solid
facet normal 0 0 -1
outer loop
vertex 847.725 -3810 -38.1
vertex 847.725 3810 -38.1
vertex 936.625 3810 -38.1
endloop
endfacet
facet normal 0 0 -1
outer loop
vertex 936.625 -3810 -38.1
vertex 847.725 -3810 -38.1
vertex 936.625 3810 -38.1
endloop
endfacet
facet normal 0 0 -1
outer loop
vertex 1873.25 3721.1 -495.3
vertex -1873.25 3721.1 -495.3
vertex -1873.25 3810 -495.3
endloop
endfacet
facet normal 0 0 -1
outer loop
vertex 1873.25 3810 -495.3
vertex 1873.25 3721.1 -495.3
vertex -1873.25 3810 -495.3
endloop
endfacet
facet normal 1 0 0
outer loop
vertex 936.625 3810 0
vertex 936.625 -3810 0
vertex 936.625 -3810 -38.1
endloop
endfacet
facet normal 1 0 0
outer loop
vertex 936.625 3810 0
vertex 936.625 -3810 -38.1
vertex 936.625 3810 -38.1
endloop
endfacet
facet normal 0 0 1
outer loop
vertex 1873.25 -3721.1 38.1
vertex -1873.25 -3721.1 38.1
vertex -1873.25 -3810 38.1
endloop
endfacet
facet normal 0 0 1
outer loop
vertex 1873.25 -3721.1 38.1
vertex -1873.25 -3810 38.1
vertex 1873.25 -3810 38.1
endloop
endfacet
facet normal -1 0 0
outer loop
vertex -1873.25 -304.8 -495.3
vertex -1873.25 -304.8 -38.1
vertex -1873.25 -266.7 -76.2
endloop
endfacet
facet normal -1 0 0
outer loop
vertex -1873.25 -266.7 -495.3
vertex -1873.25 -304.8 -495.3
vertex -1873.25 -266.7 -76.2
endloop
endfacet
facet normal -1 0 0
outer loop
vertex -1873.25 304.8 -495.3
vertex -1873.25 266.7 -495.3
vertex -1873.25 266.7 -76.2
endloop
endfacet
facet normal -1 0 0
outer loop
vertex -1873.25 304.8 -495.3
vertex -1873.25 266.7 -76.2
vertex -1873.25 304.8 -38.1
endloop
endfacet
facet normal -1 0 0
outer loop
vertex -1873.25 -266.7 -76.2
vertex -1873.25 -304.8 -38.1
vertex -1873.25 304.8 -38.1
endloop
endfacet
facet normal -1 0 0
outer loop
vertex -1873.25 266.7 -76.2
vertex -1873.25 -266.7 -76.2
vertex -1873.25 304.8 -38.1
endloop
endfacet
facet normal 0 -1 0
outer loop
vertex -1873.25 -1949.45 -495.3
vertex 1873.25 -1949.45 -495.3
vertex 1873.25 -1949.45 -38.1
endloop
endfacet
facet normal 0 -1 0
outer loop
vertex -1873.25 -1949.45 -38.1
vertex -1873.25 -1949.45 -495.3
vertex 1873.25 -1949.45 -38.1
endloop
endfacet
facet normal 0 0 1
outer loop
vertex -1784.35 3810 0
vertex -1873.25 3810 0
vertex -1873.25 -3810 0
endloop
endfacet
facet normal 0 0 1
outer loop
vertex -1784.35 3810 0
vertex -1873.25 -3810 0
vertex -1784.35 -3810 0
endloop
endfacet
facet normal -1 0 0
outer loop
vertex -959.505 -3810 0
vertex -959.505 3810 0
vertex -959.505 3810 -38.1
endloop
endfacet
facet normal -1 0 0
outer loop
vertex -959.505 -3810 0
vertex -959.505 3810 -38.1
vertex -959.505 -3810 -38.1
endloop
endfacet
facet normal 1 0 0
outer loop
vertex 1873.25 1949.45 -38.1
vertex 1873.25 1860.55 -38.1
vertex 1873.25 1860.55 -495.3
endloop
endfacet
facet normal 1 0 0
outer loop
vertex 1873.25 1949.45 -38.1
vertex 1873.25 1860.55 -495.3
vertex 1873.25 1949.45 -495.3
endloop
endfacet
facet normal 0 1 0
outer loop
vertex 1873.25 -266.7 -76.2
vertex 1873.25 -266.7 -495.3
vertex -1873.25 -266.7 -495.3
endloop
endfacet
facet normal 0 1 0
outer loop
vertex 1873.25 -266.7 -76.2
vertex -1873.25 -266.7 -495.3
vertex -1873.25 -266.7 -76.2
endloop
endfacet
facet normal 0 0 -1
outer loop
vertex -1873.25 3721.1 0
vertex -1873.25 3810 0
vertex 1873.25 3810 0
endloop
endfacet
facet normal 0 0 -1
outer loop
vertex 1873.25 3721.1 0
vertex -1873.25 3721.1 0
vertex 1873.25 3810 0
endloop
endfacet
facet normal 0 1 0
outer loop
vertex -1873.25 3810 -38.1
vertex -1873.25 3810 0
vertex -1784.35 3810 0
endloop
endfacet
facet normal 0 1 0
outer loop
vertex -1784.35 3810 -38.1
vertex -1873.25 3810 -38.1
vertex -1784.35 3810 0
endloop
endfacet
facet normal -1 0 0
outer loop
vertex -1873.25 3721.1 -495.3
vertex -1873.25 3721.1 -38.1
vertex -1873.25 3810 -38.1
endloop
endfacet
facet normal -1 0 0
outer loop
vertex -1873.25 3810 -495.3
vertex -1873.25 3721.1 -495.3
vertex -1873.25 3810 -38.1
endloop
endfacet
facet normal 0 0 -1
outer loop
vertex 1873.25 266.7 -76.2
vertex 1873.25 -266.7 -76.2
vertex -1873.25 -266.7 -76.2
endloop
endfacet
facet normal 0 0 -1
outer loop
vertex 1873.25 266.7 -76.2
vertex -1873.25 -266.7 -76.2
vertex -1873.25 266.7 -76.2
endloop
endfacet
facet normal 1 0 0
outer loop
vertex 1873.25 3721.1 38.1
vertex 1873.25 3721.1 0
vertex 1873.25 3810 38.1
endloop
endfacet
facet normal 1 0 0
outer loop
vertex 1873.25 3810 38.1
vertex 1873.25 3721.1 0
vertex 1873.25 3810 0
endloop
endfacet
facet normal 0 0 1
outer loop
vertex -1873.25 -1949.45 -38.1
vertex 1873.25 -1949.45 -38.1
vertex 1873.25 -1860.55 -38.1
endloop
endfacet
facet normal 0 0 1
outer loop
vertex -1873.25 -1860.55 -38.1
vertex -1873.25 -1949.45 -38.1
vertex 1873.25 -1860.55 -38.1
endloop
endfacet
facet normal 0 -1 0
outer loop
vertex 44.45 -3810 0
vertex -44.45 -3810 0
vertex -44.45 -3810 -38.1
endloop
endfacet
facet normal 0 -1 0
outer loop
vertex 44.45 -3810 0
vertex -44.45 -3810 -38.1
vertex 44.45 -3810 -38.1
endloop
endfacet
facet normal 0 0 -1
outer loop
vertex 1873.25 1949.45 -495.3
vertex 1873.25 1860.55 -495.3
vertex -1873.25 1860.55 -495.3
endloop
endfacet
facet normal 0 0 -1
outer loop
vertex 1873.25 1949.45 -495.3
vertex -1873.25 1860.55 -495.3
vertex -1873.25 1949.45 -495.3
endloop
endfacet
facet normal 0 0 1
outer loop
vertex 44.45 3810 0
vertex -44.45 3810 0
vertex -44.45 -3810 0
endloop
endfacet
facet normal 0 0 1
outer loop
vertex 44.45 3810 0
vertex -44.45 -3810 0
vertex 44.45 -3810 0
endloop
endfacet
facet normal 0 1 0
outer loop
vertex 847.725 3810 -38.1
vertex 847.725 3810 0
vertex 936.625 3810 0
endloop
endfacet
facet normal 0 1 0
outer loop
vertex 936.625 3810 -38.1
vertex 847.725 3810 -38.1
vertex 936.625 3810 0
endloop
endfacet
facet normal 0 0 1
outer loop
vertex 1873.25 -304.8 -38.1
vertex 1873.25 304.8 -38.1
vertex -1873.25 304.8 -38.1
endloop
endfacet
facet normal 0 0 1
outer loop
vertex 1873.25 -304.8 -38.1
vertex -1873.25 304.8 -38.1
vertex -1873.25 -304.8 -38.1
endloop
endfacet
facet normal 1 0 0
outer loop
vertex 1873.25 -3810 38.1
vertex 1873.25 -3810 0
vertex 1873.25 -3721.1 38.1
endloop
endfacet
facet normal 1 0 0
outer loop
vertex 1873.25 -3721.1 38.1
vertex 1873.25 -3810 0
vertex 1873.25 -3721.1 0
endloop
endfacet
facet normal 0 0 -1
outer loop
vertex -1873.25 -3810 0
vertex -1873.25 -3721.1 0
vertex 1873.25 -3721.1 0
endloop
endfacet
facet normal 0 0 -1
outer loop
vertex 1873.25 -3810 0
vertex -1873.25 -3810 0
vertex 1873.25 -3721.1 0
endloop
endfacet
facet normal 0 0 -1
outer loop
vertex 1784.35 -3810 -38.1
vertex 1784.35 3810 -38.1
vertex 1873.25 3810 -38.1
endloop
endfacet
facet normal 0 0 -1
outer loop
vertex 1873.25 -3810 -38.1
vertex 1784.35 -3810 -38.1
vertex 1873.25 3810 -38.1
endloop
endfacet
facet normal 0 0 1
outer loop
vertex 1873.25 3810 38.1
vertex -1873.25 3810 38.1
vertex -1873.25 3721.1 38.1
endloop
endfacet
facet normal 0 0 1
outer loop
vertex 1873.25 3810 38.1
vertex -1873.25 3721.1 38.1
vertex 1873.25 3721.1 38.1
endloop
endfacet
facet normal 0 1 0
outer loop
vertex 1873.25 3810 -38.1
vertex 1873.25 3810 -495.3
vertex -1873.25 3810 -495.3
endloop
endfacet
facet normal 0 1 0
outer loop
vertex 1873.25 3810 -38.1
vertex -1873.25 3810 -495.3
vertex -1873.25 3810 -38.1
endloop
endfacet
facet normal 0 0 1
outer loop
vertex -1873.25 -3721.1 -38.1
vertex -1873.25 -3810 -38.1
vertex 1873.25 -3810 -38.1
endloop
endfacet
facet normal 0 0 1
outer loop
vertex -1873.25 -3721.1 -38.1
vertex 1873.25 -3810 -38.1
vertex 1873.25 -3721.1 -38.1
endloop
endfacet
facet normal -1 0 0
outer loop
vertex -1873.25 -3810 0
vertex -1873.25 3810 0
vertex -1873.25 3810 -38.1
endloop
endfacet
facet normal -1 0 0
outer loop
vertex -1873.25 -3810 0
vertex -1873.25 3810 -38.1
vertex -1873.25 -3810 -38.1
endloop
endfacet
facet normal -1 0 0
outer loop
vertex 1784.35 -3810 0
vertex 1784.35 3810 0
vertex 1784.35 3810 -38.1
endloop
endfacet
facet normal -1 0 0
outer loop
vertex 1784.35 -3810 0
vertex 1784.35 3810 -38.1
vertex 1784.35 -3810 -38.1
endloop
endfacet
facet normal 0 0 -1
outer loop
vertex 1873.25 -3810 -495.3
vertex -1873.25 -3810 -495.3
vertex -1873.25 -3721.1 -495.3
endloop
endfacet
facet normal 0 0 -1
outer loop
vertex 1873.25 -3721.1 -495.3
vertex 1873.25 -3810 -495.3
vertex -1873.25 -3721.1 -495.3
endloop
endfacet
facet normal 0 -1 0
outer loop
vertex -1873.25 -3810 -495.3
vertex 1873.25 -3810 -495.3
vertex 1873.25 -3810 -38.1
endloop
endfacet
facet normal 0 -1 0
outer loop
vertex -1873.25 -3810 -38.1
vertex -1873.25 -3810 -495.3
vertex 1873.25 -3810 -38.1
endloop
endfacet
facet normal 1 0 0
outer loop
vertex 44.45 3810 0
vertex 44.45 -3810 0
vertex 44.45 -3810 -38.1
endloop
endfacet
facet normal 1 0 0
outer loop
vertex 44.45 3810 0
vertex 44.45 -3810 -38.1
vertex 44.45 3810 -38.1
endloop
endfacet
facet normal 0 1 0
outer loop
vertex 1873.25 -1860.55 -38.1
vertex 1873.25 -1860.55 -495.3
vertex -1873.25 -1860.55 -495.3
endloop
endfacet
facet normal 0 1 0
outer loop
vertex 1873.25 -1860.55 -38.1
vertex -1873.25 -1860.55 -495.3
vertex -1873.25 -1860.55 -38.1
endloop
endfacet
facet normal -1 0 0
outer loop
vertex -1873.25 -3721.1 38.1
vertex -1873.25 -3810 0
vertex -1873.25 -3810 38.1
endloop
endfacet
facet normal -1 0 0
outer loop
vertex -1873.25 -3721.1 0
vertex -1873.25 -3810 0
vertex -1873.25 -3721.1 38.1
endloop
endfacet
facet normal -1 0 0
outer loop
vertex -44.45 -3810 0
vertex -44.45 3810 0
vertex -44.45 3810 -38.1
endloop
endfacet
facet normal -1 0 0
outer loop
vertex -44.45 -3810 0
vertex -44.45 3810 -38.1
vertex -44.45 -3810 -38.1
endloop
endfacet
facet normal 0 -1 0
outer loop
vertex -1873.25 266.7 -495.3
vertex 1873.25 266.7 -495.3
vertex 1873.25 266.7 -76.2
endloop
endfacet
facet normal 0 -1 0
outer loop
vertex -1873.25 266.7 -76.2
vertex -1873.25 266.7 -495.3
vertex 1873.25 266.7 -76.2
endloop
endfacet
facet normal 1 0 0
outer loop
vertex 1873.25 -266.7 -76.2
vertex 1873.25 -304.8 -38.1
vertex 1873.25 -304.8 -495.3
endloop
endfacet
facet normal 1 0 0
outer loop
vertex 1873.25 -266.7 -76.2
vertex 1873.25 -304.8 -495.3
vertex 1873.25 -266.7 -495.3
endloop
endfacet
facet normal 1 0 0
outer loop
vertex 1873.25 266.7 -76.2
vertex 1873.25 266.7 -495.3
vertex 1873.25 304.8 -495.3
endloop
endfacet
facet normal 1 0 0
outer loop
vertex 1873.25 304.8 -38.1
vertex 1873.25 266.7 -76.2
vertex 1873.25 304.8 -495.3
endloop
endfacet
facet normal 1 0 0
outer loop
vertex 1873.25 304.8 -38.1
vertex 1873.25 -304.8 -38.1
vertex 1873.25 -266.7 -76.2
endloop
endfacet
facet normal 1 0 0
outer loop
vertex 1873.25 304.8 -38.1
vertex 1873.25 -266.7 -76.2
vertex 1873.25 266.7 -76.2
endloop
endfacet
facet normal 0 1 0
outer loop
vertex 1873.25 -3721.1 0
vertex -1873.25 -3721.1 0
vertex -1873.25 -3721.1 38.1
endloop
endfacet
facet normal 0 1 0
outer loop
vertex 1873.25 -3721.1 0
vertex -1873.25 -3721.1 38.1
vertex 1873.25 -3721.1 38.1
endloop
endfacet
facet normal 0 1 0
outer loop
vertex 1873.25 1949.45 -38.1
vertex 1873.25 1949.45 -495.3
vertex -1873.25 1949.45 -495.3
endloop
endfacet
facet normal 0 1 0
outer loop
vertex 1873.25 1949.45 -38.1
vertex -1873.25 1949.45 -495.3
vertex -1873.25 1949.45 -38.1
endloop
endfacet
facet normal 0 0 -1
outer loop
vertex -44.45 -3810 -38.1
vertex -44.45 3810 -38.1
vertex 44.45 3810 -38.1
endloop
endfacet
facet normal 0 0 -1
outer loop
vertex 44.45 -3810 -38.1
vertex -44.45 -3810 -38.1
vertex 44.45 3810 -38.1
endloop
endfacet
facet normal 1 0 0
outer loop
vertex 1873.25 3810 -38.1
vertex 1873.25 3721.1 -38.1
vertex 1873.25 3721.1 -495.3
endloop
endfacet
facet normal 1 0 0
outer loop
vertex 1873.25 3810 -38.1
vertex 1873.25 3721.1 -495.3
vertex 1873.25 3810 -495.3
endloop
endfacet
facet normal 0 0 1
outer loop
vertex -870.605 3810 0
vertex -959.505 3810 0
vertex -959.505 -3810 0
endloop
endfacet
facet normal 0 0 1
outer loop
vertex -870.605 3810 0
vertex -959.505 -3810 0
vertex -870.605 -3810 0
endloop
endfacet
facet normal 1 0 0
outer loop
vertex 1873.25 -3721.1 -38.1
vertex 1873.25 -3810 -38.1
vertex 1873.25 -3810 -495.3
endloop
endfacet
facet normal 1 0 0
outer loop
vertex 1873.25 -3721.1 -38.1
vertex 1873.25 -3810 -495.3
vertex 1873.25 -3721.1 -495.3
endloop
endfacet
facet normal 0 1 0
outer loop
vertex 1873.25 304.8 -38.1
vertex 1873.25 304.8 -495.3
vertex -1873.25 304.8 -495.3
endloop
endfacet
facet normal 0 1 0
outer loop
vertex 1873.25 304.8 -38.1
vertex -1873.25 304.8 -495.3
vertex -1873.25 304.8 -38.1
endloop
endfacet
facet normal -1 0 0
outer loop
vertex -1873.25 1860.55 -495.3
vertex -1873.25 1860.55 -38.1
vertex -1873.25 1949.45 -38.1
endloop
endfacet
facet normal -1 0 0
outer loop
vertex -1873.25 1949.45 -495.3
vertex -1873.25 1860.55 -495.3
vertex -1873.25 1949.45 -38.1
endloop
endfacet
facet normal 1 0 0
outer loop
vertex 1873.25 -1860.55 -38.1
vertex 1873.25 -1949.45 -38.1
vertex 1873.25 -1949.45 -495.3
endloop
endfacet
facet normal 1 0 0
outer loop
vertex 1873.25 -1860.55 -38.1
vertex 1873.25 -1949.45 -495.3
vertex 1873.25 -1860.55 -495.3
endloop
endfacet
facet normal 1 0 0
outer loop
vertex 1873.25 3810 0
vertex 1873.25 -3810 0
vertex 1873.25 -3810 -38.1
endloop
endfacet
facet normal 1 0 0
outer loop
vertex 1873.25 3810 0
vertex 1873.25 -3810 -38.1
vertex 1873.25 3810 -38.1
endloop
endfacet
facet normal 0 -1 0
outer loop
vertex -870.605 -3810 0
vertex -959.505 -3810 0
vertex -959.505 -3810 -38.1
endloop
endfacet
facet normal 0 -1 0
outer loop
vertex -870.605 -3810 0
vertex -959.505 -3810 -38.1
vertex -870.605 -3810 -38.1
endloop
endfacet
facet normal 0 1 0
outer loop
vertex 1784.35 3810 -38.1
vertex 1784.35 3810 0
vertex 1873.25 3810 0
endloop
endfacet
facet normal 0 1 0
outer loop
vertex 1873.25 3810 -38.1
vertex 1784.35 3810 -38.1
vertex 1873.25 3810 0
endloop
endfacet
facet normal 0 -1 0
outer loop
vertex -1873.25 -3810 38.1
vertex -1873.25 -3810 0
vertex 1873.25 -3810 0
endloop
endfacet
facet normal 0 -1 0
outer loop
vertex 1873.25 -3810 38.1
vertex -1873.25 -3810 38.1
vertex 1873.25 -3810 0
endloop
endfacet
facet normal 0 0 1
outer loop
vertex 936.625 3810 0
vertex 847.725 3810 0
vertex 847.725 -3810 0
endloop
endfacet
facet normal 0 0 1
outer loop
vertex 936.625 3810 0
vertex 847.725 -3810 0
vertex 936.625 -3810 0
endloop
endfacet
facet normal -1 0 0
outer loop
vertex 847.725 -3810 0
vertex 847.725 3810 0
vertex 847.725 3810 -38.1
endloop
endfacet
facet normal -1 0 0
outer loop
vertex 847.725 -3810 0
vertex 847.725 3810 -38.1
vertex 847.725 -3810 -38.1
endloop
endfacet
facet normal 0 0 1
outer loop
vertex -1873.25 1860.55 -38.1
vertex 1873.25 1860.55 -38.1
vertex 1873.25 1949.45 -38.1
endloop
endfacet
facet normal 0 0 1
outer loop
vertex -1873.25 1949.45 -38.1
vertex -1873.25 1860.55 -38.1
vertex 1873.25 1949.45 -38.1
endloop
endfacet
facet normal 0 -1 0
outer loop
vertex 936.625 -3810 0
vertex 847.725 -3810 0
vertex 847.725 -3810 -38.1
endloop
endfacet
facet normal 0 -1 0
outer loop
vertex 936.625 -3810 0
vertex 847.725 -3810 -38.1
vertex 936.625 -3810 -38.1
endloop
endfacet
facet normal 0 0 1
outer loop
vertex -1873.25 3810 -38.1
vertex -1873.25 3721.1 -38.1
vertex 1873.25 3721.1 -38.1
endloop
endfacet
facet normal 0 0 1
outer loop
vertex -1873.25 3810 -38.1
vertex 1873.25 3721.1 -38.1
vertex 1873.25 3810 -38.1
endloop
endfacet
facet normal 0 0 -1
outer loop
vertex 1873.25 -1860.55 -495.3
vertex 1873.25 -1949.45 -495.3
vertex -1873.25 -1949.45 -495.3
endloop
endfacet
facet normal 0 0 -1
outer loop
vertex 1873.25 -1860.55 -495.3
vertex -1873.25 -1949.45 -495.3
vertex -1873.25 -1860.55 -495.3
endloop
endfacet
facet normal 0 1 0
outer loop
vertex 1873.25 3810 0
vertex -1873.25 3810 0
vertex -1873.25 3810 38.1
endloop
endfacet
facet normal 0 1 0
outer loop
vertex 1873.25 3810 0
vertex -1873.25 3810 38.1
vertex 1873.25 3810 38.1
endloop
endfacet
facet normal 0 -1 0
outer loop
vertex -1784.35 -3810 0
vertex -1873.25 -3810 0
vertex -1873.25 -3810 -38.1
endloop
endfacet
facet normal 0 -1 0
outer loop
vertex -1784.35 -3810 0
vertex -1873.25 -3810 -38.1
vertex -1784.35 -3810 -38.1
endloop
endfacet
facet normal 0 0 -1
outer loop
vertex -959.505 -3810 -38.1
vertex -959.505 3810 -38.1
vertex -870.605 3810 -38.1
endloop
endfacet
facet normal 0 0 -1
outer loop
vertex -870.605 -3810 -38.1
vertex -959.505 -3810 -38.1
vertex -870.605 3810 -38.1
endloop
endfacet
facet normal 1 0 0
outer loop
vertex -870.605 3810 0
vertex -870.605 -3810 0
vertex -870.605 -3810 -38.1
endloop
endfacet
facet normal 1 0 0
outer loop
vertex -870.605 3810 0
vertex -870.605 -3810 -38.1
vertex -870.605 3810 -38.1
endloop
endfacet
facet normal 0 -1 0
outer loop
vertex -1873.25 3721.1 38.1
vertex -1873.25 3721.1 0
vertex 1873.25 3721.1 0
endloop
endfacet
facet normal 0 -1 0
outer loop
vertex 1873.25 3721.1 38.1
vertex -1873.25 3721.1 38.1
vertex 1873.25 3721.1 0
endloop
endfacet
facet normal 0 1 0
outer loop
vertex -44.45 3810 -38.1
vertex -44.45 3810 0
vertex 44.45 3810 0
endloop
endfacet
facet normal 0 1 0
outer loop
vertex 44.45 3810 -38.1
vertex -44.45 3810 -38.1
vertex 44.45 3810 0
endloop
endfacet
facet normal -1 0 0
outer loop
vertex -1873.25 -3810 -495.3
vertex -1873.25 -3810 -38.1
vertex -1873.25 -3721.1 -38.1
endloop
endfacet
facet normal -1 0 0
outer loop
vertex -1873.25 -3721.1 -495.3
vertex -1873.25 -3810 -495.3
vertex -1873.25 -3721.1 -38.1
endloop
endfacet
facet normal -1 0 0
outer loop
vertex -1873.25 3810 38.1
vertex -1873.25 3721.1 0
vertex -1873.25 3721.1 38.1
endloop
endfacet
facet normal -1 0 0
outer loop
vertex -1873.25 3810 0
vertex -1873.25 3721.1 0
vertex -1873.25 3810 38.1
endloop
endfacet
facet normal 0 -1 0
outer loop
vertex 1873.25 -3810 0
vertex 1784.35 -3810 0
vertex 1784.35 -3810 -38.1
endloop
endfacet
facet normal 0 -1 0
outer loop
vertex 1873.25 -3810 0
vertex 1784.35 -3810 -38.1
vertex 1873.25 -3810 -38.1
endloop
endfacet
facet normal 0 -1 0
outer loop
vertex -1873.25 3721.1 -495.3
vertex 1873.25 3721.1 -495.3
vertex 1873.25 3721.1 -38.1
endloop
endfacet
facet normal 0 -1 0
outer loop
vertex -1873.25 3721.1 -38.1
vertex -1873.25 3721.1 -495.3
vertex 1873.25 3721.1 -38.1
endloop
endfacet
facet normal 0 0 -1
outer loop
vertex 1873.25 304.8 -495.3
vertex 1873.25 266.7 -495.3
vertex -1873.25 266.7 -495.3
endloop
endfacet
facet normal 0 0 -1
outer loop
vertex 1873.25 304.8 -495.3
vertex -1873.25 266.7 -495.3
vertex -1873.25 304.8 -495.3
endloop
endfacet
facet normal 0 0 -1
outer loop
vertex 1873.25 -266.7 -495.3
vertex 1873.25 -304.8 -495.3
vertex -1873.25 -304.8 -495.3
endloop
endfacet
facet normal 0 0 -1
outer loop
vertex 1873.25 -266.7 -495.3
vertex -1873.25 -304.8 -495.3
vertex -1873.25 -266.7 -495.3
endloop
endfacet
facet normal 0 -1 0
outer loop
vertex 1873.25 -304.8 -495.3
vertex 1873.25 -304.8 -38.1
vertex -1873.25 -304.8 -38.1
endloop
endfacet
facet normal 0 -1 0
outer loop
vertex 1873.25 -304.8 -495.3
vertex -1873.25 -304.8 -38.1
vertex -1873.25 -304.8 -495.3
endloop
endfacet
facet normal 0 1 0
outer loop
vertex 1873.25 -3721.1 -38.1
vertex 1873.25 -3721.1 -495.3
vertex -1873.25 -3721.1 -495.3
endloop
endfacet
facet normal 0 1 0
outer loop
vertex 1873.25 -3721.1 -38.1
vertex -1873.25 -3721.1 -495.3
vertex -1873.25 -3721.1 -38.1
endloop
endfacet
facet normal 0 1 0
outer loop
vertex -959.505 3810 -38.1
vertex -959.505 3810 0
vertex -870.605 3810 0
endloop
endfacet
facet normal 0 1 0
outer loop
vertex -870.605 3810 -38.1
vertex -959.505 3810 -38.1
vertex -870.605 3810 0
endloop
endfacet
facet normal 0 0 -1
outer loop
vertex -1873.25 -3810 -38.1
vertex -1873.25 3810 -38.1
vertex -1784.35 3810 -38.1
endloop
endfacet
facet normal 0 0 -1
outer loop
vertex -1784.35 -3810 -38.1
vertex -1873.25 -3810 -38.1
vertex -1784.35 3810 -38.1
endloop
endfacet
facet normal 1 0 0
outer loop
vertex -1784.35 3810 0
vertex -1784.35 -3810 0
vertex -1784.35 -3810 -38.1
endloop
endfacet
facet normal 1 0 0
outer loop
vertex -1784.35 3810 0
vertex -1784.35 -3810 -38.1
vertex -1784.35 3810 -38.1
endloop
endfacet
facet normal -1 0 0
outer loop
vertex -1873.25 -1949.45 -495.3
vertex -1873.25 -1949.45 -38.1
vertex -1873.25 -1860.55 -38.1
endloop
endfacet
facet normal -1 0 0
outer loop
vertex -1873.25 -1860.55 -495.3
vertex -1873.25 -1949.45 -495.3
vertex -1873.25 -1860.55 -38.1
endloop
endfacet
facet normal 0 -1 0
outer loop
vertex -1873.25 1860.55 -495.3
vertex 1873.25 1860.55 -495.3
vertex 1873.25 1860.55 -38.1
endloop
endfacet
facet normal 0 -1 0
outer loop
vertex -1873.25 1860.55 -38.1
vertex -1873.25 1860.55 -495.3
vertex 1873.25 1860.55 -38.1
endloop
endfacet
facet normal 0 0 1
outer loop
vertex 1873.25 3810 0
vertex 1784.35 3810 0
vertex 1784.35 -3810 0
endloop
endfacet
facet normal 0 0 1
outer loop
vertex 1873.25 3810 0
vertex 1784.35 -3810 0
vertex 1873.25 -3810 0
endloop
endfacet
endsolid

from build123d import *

# Parameters (mm, degrees)
F0_W     = 88.9
F0_H     = 1905
F1_DEPTH = 38.1
F2_W     = 3746.5
F2_H     = 88.9
F3_DEPTH = 38.1
F4_W     = 88.9
F4_H     = 457.2
F4_W_2   = 38.1
F4_H_2   = 419.1
F5_DEPTH = 3746.5


with BuildPart() as f1:
    # F0 (on Top) → F1 (new body)
    with BuildSketch(Plane.XY):
        with Locations((-1828.8, 2857.5)):
            Rectangle(F0_W, F0_H)
        with Locations((-1828.8, 952.5)):
            Rectangle(F0_W, F0_H)
        with Locations((-1828.8, -952.5)):
            Rectangle(F0_W, F0_H)
        with Locations((-1828.8, -2857.5)):
            Rectangle(F0_W, F0_H)
        with Locations((-915.054604, 2857.5)):
            Rectangle(F0_W, F0_H)
        with Locations((-915.054604, 952.5)):
            Rectangle(F0_W, F0_H)
        with Locations((-915.054604, -952.5)):
            Rectangle(F0_W, F0_H)
        with Locations((-915.054604, -2857.5)):
            Rectangle(F0_W, F0_H)
        with Locations((0, 2857.5)):
            Rectangle(F0_W, F0_H)
        with Locations((0, 952.5)):
            Rectangle(F0_W, F0_H)
        with Locations((0, -952.5)):
            Rectangle(F0_W, F0_H)
        with Locations((0, -2857.5)):
            Rectangle(F0_W, F0_H)
        with Locations((892.175, 2857.5)):
            Rectangle(F0_W, F0_H)
        with Locations((892.175, 952.5)):
            Rectangle(F0_W, F0_H)
        with Locations((892.175, -952.5)):
            Rectangle(F0_W, F0_H)
        with Locations((892.175, -2857.5)):
            Rectangle(F0_W, F0_H)
        with Locations((1828.8, 2857.5)):
            Rectangle(F0_W, F0_H)
        with Locations((1828.8, 952.5)):
            Rectangle(F0_W, F0_H)
        with Locations((1828.8, -952.5)):
            Rectangle(F0_W, F0_H)
        with Locations((1828.8, -2857.5)):
            Rectangle(F0_W, F0_H)
    extrude(amount=-F1_DEPTH)


with BuildPart() as f3:
    # F2 (on face) → F3 (new body)
    with BuildSketch(Plane.XY):
        with Locations((0, 3765.55)):
            Rectangle(F2_W, F2_H)
        with Locations((0, -3765.55)):
            Rectangle(F2_W, F2_H)
    extrude(amount=F3_DEPTH)


with BuildPart() as f5:
    # F4 (on face) → F5 (new body)
    with BuildSketch(Plane.YZ.offset(1873.25)):
        with Locations((-3765.55, -266.7)):
            Rectangle(F4_W, F4_H)
        with Locations((-1905, -266.7)):
            Rectangle(F4_W, F4_H)
        Polygon((304.8, -76.2), (304.8, -38.1), (0, -38.1), (-304.8, -38.1), (-304.8, -76.2), (-266.7, -76.2), (266.7, -76.2), align=None)
        with Locations((3765.55, -266.7)):
            Rectangle(F4_W, F4_H)
        with Locations((1905, -266.7)):
            Rectangle(F4_W, F4_H)
        with Locations((285.75, -285.75)):
            Rectangle(F4_W_2, F4_H_2)
        with Locations((-285.75, -285.75)):
            Rectangle(F4_W_2, F4_H_2)
    extrude(amount=-F5_DEPTH)


solid = Compound([f1.part, f3.part, f5.part])
